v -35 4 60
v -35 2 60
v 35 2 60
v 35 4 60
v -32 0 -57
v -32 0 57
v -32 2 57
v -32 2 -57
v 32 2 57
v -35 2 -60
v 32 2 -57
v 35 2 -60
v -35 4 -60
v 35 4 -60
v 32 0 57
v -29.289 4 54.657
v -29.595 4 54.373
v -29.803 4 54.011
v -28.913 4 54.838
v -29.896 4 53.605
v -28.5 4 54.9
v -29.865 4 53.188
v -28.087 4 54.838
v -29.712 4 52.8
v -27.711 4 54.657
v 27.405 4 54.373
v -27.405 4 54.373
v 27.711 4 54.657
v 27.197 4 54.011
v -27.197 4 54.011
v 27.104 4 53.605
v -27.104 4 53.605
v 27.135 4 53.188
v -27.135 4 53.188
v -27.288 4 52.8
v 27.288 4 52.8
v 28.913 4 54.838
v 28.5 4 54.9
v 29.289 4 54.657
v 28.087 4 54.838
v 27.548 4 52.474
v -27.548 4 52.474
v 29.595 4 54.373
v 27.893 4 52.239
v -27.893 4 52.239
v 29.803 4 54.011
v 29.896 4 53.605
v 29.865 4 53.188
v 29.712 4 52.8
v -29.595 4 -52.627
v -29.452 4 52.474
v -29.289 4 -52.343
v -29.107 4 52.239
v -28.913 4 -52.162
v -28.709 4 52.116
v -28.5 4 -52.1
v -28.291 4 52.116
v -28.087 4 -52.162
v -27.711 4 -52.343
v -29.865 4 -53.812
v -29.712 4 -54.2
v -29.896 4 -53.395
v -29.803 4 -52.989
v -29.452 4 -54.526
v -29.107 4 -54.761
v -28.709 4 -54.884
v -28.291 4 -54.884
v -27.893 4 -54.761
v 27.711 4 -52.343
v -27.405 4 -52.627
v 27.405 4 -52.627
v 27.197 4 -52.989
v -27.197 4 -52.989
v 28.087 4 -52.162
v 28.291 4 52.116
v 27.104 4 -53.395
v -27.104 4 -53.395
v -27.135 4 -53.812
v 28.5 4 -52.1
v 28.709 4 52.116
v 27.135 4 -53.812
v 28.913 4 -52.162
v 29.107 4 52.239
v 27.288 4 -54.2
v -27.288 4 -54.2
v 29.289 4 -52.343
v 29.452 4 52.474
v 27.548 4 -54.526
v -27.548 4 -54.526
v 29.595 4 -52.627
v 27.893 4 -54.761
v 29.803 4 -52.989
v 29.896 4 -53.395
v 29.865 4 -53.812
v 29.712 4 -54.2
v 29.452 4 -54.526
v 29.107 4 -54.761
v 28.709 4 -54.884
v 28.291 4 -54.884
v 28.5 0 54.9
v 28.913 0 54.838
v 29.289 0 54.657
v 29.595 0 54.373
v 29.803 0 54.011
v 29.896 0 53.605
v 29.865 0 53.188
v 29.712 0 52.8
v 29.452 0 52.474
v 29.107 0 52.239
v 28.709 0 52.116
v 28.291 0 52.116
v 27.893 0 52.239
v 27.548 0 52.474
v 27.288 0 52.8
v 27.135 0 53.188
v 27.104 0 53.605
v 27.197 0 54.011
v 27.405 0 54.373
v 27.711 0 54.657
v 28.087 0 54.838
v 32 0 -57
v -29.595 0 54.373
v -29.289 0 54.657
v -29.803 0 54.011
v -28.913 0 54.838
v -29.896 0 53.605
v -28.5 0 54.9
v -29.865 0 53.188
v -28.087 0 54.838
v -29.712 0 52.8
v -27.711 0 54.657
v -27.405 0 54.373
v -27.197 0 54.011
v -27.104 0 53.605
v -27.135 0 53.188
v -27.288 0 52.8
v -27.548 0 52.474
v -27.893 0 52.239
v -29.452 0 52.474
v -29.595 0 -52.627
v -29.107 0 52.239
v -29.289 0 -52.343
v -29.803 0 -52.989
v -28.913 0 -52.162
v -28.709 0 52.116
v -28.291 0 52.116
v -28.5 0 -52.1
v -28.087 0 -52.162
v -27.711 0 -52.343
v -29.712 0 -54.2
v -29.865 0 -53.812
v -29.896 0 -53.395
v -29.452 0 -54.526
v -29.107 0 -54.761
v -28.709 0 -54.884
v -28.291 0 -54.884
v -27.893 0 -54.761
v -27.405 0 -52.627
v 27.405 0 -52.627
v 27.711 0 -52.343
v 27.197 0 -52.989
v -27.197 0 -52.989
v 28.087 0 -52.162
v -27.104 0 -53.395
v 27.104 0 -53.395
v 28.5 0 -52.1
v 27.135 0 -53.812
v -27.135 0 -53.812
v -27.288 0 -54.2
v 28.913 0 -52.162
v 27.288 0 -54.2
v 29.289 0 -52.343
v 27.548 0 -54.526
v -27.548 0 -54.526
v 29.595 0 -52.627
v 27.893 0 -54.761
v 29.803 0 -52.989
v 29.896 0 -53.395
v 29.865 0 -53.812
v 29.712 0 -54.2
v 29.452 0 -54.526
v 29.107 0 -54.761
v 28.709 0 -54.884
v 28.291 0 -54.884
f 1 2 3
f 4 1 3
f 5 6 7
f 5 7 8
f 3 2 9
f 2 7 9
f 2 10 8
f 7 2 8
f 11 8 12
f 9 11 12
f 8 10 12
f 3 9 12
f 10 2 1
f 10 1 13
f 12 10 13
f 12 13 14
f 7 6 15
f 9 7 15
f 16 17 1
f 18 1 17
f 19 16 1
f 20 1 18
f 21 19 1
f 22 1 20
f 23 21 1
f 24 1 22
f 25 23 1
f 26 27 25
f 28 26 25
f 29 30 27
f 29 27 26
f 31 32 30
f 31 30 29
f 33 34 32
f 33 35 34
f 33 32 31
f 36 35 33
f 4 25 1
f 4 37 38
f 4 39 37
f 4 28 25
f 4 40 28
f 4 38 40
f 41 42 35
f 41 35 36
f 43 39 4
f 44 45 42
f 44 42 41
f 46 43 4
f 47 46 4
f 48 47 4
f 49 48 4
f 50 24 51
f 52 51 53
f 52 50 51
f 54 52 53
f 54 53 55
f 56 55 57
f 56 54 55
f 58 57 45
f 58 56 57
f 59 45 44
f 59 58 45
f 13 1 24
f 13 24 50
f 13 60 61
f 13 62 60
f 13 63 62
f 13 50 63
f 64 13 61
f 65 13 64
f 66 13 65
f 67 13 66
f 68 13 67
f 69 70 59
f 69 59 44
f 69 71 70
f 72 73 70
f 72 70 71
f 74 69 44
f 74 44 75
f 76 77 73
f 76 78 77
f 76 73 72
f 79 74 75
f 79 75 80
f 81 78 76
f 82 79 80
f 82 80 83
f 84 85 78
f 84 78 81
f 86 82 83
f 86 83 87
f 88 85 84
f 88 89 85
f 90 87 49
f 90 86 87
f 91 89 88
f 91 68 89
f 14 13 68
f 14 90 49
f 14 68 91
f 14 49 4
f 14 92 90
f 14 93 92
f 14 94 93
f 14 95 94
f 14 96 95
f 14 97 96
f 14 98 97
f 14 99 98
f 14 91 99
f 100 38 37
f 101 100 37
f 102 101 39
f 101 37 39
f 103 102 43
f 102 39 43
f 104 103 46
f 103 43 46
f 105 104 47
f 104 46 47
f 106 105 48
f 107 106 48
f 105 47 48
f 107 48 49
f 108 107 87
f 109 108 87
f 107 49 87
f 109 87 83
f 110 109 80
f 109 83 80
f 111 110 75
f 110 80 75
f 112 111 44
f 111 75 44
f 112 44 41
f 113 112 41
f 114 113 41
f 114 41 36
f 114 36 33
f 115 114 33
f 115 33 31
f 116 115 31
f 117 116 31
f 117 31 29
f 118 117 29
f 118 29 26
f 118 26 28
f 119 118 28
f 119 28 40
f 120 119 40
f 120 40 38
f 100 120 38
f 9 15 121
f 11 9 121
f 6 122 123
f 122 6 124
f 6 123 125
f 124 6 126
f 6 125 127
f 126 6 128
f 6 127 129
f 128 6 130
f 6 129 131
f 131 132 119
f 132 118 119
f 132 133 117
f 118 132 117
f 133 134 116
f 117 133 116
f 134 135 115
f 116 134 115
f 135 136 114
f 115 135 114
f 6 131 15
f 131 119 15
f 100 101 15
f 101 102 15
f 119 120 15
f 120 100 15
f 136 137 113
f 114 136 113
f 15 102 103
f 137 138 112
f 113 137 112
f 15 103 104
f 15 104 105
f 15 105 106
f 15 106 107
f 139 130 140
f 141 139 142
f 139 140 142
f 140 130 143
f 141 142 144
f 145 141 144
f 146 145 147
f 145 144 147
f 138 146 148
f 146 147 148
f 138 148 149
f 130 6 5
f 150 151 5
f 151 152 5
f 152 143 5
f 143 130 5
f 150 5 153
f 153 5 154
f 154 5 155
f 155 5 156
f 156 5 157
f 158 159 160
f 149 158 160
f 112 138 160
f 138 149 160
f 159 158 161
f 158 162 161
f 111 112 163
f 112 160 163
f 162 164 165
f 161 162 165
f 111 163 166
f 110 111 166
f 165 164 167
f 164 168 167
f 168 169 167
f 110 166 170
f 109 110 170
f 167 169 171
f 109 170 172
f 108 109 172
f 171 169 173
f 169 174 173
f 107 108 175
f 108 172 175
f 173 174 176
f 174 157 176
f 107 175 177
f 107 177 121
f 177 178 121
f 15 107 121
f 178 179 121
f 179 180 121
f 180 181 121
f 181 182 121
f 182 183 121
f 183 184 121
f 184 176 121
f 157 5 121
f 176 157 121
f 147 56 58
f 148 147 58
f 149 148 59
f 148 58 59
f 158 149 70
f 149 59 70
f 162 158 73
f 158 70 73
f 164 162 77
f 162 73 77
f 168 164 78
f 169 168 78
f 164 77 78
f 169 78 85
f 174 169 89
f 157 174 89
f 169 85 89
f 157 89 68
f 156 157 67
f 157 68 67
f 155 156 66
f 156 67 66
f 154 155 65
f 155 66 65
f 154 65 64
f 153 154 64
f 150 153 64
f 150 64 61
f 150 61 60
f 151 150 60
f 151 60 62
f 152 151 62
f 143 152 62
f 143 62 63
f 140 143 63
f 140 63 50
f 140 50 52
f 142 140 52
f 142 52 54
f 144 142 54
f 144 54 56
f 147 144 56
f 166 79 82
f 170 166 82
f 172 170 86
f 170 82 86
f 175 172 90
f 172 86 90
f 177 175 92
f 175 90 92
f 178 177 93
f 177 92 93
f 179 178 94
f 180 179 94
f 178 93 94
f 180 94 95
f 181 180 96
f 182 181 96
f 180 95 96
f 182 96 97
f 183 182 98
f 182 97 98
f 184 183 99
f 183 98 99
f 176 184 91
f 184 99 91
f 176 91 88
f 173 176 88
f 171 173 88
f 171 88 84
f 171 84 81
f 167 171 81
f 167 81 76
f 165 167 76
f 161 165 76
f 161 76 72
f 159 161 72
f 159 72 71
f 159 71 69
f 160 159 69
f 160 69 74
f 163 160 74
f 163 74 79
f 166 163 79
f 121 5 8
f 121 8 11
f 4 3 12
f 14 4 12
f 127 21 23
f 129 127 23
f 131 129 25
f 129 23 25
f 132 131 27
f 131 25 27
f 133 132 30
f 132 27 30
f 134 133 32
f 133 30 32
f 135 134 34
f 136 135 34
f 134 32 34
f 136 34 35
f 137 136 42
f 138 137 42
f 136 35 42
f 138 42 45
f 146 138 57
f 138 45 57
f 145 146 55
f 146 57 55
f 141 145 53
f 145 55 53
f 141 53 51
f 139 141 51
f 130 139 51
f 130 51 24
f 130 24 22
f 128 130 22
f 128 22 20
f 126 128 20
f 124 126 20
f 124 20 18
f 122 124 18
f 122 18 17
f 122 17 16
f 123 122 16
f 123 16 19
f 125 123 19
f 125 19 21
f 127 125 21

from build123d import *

# Parameters (mm, degrees)
SKETCH_1_W          = 64
SKETCH_1_H          = 114
EXTRUDE_1_DEPTH     = 2
SKETCH_2_W          = 70
SKETCH_2_H          = 120
EXTRUDE_4_DEPTH     = 2
SKETCH_4_R          = 1.4
CUT_EXTRUDE_1_DEPTH = 70.577295147


with BuildPart() as part:
    # Эскиз1 → Бобышка-Вытянуть1 (new body)
    with BuildSketch(Plane(origin=(0, 0, 0), x_dir=(1, 0, 0), z_dir=(0, 1, 0))):
        Rectangle(SKETCH_1_W, SKETCH_1_H)
    extrude(amount=EXTRUDE_1_DEPTH)

    # Эскиз2 → Бобышка-Вытянуть4 (add)
    with BuildSketch(Plane(origin=(0, 2, 0), x_dir=(1, 0, 0), z_dir=(0, 1, 0))):
        Rectangle(SKETCH_2_W, SKETCH_2_H)
    extrude(amount=EXTRUDE_4_DEPTH)

    # Эскиз4 → Вырез-Вытянуть1 (cut, through all)
    with BuildSketch(Plane(origin=(0, 4, 0), x_dir=(1, 0, 0), z_dir=(0, 1, 0))):
        with Locations(Location((-28.5, 53.5, 0), (0, 0, 270))):
            Circle(SKETCH_4_R)
        with Locations(Location((28.5, 53.5, 0), (0, 0, 270))):
            Circle(SKETCH_4_R)
        with Locations(Location((-28.5, -53.5, 0), (0, 0, 270))):
            Circle(SKETCH_4_R)
        with Locations(Location((28.5, -53.5, 0), (0, 0, 270))):
            Circle(SKETCH_4_R)
    extrude(amount=-CUT_EXTRUDE_1_DEPTH, mode=Mode.SUBTRACT)


solid = part.part
